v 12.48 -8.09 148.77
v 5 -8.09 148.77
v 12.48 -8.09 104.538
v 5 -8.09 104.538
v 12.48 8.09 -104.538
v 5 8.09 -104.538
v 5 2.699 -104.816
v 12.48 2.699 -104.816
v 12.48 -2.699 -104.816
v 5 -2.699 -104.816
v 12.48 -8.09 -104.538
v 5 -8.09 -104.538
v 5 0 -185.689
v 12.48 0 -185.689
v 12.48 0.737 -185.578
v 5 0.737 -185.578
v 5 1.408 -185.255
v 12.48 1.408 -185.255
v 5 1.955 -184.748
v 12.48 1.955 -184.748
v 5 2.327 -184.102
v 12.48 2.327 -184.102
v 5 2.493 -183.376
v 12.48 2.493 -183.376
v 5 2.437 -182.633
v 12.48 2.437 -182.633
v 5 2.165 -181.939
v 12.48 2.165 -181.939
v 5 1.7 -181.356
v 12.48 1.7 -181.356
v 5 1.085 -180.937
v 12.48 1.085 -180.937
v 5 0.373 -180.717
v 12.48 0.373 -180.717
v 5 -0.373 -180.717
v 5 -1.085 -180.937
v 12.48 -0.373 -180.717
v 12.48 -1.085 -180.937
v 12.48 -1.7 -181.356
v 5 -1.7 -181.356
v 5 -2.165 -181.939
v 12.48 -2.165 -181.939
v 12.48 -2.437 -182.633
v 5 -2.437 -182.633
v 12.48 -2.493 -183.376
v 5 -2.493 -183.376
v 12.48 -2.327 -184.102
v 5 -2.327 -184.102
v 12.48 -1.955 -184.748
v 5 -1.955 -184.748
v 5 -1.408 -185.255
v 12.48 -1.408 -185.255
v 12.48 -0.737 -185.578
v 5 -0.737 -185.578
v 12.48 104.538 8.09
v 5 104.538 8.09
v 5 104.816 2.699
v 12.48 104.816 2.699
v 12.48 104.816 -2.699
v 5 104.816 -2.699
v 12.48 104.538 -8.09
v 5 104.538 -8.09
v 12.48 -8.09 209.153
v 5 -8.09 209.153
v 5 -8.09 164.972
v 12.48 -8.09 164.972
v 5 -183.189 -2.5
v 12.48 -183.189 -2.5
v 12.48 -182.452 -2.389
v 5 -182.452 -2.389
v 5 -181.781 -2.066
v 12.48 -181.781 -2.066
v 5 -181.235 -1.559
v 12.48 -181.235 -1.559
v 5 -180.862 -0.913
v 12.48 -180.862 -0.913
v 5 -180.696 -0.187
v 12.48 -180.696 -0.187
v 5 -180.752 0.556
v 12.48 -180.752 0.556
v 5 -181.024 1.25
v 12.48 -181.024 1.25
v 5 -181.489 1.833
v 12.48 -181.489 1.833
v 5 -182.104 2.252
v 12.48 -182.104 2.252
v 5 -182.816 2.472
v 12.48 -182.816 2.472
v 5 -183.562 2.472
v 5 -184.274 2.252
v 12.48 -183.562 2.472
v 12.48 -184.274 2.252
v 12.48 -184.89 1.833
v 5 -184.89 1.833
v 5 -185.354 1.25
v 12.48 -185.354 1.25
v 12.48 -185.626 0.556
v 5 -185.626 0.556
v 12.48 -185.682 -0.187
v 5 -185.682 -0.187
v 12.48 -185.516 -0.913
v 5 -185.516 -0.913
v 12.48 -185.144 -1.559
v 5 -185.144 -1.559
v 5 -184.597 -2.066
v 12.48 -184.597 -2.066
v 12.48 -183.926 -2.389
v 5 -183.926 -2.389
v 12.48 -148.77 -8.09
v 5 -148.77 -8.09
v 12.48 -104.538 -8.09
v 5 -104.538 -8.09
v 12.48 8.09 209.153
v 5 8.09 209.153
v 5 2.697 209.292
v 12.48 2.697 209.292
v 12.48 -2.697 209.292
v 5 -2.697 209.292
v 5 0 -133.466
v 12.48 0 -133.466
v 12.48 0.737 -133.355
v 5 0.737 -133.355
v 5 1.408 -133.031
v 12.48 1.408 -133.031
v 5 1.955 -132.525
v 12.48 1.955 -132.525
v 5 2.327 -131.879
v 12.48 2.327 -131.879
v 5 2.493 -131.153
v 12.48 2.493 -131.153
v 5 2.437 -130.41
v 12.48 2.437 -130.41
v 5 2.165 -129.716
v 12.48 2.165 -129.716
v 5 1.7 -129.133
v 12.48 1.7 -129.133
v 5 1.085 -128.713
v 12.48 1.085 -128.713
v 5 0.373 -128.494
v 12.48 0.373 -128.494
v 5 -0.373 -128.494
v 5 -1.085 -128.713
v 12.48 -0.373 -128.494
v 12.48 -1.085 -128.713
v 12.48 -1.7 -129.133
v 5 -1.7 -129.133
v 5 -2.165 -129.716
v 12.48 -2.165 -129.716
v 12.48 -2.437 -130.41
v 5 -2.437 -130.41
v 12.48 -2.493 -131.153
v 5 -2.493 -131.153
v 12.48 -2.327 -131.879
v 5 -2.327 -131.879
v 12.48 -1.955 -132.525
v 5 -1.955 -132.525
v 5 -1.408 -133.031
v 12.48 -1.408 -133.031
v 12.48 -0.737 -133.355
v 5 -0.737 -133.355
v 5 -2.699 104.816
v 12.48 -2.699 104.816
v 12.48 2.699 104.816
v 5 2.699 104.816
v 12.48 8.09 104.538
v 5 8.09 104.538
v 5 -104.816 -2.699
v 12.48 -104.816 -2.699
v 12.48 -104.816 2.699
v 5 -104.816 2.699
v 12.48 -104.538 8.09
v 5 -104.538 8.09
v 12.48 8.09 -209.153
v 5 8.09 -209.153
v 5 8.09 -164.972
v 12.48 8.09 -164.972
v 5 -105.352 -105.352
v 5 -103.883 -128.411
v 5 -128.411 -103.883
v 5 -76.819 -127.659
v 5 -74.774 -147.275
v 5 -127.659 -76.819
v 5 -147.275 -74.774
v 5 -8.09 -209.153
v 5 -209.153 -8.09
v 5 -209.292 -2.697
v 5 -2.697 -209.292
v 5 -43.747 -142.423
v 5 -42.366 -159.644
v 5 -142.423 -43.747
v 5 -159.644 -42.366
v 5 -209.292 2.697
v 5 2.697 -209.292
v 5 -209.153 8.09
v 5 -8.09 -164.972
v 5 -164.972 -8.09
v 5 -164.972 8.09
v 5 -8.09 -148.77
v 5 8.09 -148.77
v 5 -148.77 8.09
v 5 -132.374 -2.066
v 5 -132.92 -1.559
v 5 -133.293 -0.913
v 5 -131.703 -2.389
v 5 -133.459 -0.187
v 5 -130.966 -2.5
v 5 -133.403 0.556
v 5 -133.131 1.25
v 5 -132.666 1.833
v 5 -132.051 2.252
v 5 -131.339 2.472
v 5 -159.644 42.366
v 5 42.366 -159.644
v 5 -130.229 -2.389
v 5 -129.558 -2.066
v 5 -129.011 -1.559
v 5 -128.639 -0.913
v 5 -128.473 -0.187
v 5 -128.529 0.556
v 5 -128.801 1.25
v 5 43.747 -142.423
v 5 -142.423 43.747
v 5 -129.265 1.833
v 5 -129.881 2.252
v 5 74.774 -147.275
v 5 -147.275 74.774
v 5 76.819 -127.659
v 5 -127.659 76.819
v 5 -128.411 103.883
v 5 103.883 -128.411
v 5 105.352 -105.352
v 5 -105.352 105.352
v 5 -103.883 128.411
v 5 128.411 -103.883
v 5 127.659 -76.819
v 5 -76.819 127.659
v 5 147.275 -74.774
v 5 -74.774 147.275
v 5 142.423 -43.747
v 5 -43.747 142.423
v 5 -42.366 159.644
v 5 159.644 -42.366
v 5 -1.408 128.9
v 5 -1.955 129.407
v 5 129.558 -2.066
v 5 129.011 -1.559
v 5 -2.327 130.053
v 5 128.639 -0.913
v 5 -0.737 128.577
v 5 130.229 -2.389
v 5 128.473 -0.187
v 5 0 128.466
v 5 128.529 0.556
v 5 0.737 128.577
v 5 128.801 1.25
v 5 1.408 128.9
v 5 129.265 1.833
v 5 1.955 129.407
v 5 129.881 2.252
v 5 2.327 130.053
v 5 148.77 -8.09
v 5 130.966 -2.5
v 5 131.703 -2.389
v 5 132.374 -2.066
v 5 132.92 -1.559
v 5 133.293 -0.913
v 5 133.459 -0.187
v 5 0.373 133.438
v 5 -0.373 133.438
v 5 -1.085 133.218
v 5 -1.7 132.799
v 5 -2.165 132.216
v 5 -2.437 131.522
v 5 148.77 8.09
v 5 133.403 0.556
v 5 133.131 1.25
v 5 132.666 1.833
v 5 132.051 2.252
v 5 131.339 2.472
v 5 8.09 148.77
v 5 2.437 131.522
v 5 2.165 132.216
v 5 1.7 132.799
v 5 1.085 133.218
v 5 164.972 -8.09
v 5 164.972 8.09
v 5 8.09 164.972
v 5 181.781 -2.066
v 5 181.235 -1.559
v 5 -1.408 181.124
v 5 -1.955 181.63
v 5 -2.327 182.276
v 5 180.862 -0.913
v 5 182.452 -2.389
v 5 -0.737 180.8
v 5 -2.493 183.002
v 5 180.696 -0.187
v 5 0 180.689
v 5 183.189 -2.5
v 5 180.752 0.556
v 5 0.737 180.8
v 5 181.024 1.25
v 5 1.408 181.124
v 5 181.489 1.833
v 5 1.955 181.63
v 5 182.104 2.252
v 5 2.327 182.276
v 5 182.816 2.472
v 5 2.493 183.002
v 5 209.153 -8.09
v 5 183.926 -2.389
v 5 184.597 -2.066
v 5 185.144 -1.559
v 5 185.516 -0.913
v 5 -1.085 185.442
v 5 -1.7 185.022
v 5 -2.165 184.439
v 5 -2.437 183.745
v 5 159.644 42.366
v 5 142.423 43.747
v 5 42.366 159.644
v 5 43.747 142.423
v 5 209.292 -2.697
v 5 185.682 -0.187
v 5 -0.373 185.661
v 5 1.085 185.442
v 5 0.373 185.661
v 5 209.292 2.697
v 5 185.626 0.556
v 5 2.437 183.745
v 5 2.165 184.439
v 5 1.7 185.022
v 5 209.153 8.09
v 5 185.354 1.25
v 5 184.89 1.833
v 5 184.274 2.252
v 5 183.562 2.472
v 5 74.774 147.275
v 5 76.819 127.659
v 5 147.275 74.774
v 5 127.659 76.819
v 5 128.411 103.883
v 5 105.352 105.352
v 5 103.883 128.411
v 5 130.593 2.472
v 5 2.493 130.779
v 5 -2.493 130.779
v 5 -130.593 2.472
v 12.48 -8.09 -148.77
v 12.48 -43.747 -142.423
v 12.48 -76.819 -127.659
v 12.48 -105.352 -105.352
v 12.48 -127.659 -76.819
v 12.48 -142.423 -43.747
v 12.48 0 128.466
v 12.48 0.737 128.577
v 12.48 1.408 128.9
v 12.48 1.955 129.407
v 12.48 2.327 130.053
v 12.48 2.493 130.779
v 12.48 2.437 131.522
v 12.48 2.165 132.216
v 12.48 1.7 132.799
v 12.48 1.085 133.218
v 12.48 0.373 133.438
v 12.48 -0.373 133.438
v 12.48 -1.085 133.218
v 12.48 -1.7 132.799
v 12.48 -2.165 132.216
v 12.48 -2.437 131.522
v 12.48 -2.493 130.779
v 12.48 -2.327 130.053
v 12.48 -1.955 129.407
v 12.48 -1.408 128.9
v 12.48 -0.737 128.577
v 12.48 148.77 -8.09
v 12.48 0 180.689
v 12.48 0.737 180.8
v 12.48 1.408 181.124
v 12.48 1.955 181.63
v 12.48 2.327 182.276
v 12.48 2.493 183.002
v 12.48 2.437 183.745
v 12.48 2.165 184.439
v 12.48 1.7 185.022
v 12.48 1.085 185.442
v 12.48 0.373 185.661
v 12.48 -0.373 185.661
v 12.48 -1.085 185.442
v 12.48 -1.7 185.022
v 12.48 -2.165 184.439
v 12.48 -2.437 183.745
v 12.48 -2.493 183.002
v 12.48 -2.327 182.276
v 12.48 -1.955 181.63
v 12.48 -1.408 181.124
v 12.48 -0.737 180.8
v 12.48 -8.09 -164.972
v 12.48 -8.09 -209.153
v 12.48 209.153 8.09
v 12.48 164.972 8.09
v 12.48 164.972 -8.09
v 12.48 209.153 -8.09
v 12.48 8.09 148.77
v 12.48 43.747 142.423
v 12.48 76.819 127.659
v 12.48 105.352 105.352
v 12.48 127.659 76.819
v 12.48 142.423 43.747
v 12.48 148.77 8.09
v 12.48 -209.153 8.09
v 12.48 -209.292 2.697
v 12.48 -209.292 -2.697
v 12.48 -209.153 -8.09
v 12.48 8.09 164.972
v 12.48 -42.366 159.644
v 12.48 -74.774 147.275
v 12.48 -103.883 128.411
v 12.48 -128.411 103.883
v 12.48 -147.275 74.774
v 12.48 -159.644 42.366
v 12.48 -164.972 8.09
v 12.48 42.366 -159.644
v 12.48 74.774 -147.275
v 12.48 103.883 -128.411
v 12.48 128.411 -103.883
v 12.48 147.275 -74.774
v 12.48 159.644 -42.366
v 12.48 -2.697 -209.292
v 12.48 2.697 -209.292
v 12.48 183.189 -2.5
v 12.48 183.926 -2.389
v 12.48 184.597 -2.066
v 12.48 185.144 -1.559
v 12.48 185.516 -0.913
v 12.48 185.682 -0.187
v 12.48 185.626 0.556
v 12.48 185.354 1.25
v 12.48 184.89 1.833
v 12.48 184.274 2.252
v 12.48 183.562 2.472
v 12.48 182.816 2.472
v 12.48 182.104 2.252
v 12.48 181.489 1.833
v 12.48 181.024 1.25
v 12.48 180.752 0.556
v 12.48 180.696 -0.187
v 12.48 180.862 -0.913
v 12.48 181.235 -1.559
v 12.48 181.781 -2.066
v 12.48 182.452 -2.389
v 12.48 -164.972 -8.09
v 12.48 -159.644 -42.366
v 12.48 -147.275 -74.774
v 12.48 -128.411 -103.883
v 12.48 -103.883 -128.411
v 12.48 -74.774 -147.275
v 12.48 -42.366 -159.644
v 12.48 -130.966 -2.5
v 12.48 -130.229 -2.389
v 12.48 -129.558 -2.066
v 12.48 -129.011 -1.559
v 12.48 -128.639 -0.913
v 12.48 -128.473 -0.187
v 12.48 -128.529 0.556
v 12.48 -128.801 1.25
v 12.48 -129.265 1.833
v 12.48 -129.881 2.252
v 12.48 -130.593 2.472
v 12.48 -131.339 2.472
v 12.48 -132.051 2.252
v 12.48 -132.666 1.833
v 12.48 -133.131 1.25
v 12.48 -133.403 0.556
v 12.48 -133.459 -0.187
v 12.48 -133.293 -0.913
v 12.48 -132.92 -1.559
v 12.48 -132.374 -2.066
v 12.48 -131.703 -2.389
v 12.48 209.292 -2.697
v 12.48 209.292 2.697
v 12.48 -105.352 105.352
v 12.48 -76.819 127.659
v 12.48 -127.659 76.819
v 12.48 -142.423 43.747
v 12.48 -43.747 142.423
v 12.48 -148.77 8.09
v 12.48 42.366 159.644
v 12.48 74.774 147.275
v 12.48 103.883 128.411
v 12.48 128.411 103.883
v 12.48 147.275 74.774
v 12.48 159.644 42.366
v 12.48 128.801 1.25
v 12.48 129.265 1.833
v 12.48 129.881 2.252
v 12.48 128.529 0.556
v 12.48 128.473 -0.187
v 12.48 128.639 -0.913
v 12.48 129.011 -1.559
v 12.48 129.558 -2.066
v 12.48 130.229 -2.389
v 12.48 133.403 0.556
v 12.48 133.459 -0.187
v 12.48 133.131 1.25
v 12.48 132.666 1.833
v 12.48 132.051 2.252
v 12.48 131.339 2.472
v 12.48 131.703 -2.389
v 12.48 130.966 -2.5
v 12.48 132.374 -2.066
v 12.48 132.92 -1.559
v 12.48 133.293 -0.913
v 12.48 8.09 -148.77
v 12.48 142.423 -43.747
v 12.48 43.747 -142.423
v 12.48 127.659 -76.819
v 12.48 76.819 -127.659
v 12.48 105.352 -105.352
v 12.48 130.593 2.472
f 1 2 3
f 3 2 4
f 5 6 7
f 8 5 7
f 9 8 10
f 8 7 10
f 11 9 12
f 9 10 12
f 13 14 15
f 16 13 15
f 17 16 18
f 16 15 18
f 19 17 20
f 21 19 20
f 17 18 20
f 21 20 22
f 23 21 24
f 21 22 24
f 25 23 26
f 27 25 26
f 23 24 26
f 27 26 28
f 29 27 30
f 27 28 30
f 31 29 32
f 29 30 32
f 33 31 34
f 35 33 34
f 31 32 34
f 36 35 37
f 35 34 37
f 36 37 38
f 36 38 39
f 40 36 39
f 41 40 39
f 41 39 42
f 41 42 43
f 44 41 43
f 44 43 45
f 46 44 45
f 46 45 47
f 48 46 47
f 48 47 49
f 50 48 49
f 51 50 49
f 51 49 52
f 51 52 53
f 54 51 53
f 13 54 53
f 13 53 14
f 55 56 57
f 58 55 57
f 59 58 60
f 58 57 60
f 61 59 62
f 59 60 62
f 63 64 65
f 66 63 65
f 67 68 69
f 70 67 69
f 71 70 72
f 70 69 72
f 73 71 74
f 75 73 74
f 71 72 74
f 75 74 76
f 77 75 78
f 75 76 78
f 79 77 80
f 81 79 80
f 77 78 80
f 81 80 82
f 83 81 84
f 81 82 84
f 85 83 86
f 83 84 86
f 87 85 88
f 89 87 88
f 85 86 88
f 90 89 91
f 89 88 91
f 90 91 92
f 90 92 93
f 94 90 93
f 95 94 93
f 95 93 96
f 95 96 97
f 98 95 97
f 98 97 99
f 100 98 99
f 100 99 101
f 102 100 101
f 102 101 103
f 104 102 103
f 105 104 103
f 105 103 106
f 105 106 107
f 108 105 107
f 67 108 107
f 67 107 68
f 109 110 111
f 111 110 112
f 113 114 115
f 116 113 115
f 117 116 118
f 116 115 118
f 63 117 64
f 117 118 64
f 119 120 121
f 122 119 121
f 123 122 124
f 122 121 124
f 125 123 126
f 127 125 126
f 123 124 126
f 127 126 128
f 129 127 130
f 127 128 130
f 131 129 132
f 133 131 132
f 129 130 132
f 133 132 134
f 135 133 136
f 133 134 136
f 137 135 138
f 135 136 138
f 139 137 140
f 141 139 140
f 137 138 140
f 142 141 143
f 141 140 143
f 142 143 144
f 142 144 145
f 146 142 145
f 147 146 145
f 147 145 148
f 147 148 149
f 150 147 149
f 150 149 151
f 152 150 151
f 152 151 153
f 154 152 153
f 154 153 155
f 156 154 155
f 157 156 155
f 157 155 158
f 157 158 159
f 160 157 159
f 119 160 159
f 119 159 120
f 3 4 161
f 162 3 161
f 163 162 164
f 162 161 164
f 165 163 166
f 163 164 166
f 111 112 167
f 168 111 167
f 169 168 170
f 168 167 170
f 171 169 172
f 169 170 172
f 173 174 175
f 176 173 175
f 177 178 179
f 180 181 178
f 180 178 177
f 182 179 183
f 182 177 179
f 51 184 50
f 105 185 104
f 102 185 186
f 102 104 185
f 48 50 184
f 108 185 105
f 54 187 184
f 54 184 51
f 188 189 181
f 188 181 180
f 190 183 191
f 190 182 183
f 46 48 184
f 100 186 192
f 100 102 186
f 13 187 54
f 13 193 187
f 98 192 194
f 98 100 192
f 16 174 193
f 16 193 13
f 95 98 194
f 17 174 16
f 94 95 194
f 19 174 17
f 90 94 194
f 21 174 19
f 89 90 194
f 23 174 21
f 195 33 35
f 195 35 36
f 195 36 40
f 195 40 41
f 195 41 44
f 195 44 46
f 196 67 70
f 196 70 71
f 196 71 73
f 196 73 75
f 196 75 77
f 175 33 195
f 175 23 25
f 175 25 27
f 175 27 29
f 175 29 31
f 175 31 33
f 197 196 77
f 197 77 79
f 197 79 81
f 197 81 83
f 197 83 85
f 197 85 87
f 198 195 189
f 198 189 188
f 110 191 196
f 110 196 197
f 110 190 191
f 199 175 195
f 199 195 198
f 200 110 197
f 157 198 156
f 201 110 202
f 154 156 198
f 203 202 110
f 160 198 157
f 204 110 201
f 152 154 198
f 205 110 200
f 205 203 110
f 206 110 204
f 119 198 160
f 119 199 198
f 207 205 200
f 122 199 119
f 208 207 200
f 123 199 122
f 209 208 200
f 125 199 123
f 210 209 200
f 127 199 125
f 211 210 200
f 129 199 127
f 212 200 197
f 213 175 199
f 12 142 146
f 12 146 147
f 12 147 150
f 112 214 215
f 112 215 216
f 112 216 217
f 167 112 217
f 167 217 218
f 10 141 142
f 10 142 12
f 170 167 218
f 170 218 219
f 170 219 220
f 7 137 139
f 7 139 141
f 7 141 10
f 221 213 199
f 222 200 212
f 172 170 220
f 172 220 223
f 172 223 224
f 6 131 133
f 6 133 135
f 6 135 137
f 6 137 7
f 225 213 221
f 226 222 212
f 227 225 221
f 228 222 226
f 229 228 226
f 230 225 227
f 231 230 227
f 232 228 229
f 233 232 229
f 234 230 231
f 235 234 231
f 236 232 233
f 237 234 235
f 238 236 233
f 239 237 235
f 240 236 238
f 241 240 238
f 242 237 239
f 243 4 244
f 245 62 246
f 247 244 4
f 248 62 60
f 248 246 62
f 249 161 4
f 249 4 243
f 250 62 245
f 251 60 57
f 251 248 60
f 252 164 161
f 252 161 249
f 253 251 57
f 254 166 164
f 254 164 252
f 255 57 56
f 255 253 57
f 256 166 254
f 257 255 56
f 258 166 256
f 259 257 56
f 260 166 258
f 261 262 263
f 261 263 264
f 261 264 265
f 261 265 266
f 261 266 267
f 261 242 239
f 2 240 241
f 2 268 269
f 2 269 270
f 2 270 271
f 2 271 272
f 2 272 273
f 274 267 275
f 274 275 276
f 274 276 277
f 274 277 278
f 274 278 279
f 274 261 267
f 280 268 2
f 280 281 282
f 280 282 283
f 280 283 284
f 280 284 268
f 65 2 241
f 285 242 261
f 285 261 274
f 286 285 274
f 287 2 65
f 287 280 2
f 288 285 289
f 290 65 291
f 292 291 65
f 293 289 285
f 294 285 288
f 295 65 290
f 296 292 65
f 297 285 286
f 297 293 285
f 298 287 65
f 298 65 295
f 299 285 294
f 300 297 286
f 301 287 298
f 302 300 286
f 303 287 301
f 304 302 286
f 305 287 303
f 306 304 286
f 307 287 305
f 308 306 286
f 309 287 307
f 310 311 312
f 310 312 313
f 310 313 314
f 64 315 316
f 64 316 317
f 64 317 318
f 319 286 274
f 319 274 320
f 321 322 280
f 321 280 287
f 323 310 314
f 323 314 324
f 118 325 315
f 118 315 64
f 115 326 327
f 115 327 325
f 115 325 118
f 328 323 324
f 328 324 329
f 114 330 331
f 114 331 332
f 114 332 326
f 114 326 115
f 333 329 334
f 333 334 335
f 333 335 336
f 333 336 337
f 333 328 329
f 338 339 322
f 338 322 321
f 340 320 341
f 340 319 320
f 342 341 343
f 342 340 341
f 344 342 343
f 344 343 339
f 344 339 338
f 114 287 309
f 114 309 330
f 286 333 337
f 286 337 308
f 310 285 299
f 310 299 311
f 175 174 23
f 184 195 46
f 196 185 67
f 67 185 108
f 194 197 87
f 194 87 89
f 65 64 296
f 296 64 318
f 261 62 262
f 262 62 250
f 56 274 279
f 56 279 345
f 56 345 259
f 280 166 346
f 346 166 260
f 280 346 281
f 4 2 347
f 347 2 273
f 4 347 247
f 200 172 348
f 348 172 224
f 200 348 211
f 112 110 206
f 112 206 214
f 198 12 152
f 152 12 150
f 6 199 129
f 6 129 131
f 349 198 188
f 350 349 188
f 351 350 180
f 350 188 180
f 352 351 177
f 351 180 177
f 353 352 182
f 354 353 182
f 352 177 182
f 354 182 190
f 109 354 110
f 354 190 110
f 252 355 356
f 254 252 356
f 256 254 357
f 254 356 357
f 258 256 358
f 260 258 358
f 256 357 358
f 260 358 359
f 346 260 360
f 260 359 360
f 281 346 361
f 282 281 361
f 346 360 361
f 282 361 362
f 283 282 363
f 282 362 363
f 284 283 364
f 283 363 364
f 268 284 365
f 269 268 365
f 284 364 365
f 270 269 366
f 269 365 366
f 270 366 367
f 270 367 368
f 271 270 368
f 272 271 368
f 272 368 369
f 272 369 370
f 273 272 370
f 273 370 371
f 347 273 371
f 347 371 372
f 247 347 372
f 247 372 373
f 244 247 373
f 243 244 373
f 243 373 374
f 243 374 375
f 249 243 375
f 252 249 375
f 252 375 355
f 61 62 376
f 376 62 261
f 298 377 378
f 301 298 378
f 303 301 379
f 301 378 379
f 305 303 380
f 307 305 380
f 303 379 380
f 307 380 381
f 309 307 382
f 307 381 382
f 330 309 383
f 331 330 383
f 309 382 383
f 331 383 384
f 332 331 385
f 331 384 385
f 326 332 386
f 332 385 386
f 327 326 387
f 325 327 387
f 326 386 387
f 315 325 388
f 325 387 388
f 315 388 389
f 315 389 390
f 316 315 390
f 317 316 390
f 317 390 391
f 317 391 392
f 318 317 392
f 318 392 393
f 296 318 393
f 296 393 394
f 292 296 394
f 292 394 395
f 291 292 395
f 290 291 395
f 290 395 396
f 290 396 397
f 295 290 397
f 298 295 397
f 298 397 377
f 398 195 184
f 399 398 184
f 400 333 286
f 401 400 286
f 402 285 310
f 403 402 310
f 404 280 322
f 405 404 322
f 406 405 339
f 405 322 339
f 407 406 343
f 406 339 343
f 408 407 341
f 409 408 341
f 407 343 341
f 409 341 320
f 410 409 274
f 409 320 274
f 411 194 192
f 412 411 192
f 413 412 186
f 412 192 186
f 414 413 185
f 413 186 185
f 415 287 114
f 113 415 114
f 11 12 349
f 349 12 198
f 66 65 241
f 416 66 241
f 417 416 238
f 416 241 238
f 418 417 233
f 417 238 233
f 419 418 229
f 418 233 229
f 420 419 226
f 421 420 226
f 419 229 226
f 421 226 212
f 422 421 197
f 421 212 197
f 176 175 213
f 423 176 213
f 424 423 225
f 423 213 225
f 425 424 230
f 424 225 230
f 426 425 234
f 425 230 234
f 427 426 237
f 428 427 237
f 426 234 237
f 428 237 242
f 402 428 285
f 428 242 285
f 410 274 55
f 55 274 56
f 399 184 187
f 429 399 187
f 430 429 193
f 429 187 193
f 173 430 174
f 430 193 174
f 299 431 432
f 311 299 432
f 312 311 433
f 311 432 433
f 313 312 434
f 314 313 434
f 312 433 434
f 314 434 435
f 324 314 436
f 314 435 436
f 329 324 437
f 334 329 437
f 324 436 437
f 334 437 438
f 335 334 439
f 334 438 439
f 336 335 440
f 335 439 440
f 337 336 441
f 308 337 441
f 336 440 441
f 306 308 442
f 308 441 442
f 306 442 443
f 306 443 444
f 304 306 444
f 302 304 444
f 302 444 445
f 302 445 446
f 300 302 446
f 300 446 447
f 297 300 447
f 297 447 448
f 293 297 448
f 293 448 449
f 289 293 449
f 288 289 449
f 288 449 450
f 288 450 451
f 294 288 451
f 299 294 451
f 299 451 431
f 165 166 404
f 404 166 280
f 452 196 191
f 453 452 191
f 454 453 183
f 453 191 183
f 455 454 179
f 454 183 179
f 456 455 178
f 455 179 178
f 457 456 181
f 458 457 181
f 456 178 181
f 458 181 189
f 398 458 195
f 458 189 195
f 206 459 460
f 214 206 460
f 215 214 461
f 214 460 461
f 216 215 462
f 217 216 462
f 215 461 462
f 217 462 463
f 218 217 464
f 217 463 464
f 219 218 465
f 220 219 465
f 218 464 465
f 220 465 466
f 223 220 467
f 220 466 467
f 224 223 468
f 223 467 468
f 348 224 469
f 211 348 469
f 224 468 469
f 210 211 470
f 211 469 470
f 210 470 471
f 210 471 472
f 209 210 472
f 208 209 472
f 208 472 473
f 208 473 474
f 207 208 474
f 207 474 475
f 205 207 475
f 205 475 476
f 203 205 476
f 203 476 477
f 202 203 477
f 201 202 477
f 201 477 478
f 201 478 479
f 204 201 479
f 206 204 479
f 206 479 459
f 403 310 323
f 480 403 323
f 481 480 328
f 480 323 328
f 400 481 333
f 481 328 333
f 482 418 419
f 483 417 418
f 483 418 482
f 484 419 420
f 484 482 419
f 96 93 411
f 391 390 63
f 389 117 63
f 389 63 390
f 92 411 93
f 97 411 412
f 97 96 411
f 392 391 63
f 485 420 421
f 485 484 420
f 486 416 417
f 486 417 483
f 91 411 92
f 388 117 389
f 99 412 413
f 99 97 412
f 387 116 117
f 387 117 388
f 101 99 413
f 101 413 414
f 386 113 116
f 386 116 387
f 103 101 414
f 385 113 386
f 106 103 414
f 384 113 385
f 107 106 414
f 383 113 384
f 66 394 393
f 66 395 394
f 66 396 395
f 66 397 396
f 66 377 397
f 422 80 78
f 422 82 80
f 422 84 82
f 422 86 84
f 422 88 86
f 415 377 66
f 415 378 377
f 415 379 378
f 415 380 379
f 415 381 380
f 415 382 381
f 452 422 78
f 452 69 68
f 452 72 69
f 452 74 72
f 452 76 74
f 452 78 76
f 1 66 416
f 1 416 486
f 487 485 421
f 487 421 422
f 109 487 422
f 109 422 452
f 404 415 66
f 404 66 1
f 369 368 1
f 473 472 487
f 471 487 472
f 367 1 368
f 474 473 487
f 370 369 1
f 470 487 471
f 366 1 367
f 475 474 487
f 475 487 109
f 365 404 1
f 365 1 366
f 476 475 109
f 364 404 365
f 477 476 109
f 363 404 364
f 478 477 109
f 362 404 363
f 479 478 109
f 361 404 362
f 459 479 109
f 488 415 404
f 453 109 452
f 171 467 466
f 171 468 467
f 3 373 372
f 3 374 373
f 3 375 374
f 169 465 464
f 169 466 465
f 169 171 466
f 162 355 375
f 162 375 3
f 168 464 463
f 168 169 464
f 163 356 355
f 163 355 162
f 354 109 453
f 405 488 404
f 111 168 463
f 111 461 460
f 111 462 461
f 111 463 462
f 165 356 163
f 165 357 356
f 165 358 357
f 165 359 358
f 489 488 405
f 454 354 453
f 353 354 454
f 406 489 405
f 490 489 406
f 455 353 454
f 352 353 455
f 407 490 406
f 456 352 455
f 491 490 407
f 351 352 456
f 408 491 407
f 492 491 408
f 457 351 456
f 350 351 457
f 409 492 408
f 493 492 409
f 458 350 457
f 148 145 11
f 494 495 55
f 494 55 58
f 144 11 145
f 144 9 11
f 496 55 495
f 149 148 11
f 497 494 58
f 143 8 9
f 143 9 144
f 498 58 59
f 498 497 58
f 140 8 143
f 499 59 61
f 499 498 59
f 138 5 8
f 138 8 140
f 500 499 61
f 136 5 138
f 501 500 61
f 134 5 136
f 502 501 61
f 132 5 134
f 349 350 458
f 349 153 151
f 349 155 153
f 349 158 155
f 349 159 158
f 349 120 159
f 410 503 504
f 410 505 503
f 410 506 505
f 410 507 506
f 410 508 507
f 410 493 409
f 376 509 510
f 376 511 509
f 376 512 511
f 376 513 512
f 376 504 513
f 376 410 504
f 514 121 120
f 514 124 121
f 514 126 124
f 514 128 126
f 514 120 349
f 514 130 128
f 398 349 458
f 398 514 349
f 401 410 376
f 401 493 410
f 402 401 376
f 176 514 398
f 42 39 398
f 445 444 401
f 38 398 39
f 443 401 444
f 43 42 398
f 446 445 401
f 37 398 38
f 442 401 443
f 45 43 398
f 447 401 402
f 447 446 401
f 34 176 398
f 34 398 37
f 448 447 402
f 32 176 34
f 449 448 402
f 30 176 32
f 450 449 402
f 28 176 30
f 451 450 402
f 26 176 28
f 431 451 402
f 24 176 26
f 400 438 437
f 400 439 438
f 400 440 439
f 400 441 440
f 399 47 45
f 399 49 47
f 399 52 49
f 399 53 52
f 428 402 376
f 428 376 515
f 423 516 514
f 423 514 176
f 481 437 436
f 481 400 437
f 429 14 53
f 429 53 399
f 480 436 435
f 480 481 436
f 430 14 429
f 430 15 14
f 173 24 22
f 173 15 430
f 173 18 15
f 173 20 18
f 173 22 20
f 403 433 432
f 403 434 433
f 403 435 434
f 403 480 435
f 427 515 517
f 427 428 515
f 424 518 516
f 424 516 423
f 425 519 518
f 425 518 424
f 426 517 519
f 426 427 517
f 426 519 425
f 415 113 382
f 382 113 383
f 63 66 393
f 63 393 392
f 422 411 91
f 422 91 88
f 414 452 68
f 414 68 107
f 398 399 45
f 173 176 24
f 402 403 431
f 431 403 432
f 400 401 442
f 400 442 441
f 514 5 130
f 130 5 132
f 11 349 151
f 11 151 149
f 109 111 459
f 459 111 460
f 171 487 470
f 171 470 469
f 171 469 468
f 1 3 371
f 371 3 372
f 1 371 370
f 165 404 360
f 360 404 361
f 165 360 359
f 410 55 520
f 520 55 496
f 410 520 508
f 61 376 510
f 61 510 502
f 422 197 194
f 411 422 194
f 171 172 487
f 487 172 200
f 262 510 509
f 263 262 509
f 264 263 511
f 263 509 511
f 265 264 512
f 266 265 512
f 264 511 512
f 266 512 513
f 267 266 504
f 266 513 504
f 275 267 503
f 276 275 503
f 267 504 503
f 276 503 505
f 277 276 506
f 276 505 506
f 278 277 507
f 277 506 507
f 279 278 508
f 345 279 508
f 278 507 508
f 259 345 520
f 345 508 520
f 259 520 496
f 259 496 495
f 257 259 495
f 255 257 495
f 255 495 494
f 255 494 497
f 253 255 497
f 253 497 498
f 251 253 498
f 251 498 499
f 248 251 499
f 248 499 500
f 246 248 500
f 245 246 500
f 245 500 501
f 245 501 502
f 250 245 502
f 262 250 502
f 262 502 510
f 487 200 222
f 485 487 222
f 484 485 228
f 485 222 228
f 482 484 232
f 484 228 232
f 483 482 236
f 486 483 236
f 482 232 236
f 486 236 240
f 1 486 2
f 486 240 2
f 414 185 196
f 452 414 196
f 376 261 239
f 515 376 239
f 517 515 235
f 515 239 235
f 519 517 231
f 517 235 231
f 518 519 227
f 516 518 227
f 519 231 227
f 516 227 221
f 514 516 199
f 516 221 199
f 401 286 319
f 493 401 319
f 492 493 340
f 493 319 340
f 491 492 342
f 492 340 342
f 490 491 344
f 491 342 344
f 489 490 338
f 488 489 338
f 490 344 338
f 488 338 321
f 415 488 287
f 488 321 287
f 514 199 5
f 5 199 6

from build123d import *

# Parameters (mm, degrees)
SKETCH1_W           = 450
SKETCH1_H           = 450
BOSS_EXTRUDE1_DEPTH = 5
BOSS_EXTRUDE2_DEPTH = 7.48
BOSS_EXTRUDE3_DEPTH = 7.48
SKETCH6_W           = 450
SKETCH6_H           = 450
CUT_EXTRUDE1_DEPTH  = 5
SKETCH7_R           = 11
SKETCH7_R_2         = 2.5
CUT_EXTRUDE2_DEPTH  = 10
SKETCH8_R           = 2.5
CUT_EXTRUDE4_DEPTH  = 10


# Read off the part's stored shape, not the designer's step: Boss-Extrude2
with BuildPart() as part:
    # Sketch1 → Boss-Extrude1 (new body)
    with BuildSketch(Plane(origin=(0, 0, 0), x_dir=(0, 0, -1), z_dir=(1, 0, 0))):
        Rectangle(SKETCH1_W, SKETCH1_H)
    extrude(amount=BOSS_EXTRUDE1_DEPTH)

    # Boss-Extrude2 outline → Boss-Extrude2 (add)
    with BuildSketch(Plane(origin=(5, 0, 0), x_dir=(0, 0, -1), z_dir=(1, 0, 0))):
        with BuildLine():
            Line((-164.971757583, 8.09), (-209.152698388, 8.09))
            ThreePointArc((-209.152698388, 8.09), (-209.3091, 0), (-209.152698388, -8.09))
            Line((-209.152698388, -8.09), (-164.971757583, -8.09))
            ThreePointArc((-164.971757583, -8.09), (-116.792827049, -116.792827049), (-8.09, -164.971757583))
            Line((-8.09, -164.971757583), (-8.09, -209.152698388))
            ThreePointArc((-8.09, -209.152698388), (0, -209.3091), (8.09, -209.152698388))
            Line((8.09, -209.152698388), (8.09, -164.971757583))
            ThreePointArc((8.09, -164.971757583), (116.792827049, -116.792827049), (164.971757583, -8.09))
            Line((164.971757583, -8.09), (209.152698388, -8.09))
            ThreePointArc((209.152698388, -8.09), (209.3091, 0), (209.152698388, 8.09))
            Line((209.152698388, 8.09), (164.971757583, 8.09))
            ThreePointArc((164.971757583, 8.09), (116.792827049, 116.792827049), (8.09, 164.971757583))
            Line((8.09, 164.971757583), (8.09, 209.152698388))
            ThreePointArc((8.09, 209.152698388), (0, 209.3091), (-8.09, 209.152698388))
            Line((-8.09, 209.152698388), (-8.09, 164.971757583))
            ThreePointArc((-8.09, 164.971757583), (-116.792827049, 116.792827049), (-164.971757583, 8.09))
        make_face()
        with BuildLine():
            Line((148.770198629, 8.09), (104.538333308, 8.09))
            ThreePointArc((104.538333308, 8.09), (104.8509, 0), (104.538333308, -8.09))
            Line((104.538333308, -8.09), (148.770198629, -8.09))
            ThreePointArc((148.770198629, -8.09), (105.351839329, -105.351839329), (8.09, -148.770198629))
            Line((8.09, -148.770198629), (8.09, -104.538333308))
            ThreePointArc((8.09, -104.538333308), (0, -104.8509), (-8.09, -104.538333308))
            Line((-8.09, -104.538333308), (-8.09, -148.770198629))
            ThreePointArc((-8.09, -148.770198629), (-105.351839329, -105.351839329), (-148.770198629, -8.09))
            Line((-148.770198629, -8.09), (-104.538333308, -8.09))
            ThreePointArc((-104.538333308, -8.09), (-104.8509, 0), (-104.538333308, 8.09))
            Line((-104.538333308, 8.09), (-148.770198629, 8.09))
            ThreePointArc((-148.770198629, 8.09), (-105.351839329, 105.351839329), (-8.09, 148.770198629))
            Line((-8.09, 148.770198629), (-8.09, 104.538333308))
            ThreePointArc((-8.09, 104.538333308), (0, 104.8509), (8.09, 104.538333308))
            Line((8.09, 104.538333308), (8.09, 148.770198629))
            ThreePointArc((8.09, 148.770198629), (105.351839329, 105.351839329), (148.770198629, 8.09))
        make_face(mode=Mode.SUBTRACT)
    extrude(amount=BOSS_EXTRUDE2_DEPTH)

    # Sketch5 → Boss-Extrude3 (add)
    with BuildSketch(Plane(origin=(5, 0, 0), x_dir=(0, 0, -1), z_dir=(1, 0, 0))):
        with BuildLine():
            Line((-19.319547743, 8.09), (-104.275748565, 8.09))
            ThreePointArc((-104.275748565, 8.09), (-104.5891, 0), (-104.275748565, -8.09))
            Line((-104.275748565, -8.09), (-19.319547743, -8.09))
            ThreePointArc((-19.319547743, -8.09), (0, -20.945), (19.319547743, -8.09))
            Line((19.319547743, -8.09), (104.275748565, -8.09))
            ThreePointArc((104.275748565, -8.09), (104.5891, 0), (104.275748565, 8.09))
            Line((104.275748565, 8.09), (19.319547743, 8.09))
            ThreePointArc((19.319547743, 8.09), (0, 20.945), (-19.319547743, 8.09))
        make_face()
    extrude(amount=BOSS_EXTRUDE3_DEPTH)

    # Sketch6 → Cut-Extrude1 (cut)
    with BuildSketch(Plane.ZY):
        Rectangle(SKETCH6_W, SKETCH6_H)
    extrude(amount=-CUT_EXTRUDE1_DEPTH, mode=Mode.SUBTRACT)


with BuildPart() as cut_extrude1_piece_1:
    # of the separate pieces the step leaves, piece 1, a body of its own (cut_extrude1_pieces)
    add(part.part.solids().sort_by_distance((5, 209.152698388, 8.09))[0])


with BuildPart() as cut_extrude1_piece_2:
    # of the separate pieces the step leaves, piece 2, a body of its own (cut_extrude1_pieces)
    add(part.part.solids().sort_by_distance((5, 8.09, -104.275748565))[0])


with BuildPart() as cut_extrude2_tool:
    # Sketch7 → Cut-Extrude2 (new body)
    with BuildSketch(Plane(origin=(12.48, 0, 0), x_dir=(0, 0, -1), z_dir=(1, 0, 0))):
        Circle(SKETCH7_R)
        with Locations((-183.1891, 0)):
            Circle(SKETCH7_R_2)
        with Locations((-130.9659, 0)):
            Circle(SKETCH7_R_2)
        with Locations((0, -183.1891)):
            Circle(SKETCH7_R_2)
        with Locations((0, -130.9659)):
            Circle(SKETCH7_R_2)
        with Locations((183.1891, 0)):
            Circle(SKETCH7_R_2)
        with Locations((52.3, 0)):
            Circle(SKETCH7_R_2)
        with Locations((-52.295, 0)):
            Circle(SKETCH7_R_2)
        with Locations((0, 183.1891)):
            Circle(SKETCH7_R_2)
        with Locations((0, 130.9659)):
            Circle(SKETCH7_R_2)
        with BuildLine():
            Line((-3, 13.8), (-3, 10.583005244))
            ThreePointArc((-3, 10.583005244), (0, 11), (3, 10.583005244))
            Line((3, 10.583005244), (3, 13.8))
            Line((3, 13.8), (-3, 13.8))
        make_face()
        with Locations((130.9659, 0)):
            Circle(SKETCH7_R_2)
    extrude(amount=-CUT_EXTRUDE2_DEPTH)


with BuildPart() as cut_extrude1_piece_1_1:
    add(cut_extrude1_piece_1.part)

    # Cut-Extrude2: cut by cut_extrude2_tool
    add(cut_extrude2_tool.part, mode=Mode.SUBTRACT)


with BuildPart() as cut_extrude1_piece_2_1:
    add(cut_extrude1_piece_2.part)

    # Cut-Extrude2: cut by cut_extrude2_tool
    add(cut_extrude2_tool.part, mode=Mode.SUBTRACT)

    # Sketch8 → Cut-Extrude4 (cut)
    with BuildSketch(Plane(origin=(12.48, 0, 0), x_dir=(0, 0, -1), z_dir=(1, 0, 0))):
        with BuildLine():
            ThreePointArc((19.319547743, 8.09), (0, 20.945), (-19.319547743, 8.09))
            Line((-19.319547743, 8.09), (-104.275748565, 8.09))
            ThreePointArc((-104.275748565, 8.09), (-104.5891, 0), (-104.275748565, -8.09))
            Line((-104.275748565, -8.09), (-19.319547743, -8.09))
            ThreePointArc((-19.319547743, -8.09), (0, -20.945), (19.319547743, -8.09))
            Line((19.319547743, -8.09), (104.275748565, -8.09))
            ThreePointArc((104.275748565, -8.09), (104.5891, 0), (104.275748565, 8.09))
            Line((104.275748565, 8.09), (19.319547743, 8.09))
        make_face()
        with Locations((-52.295, 0)):
            Circle(SKETCH8_R, mode=Mode.SUBTRACT)
        with Locations((52.3, 0)):
            Circle(SKETCH8_R, mode=Mode.SUBTRACT)
        with BuildLine():
            Line((3, 13.8), (3, 10.583005244))
            ThreePointArc((3, 10.583005244), (0, -11), (-3, 10.583005244))
            Line((-3, 10.583005244), (-3, 13.8))
            Line((-3, 13.8), (3, 13.8))
        make_face(mode=Mode.SUBTRACT)
    extrude(amount=-CUT_EXTRUDE4_DEPTH, mode=Mode.SUBTRACT)


solid = cut_extrude1_piece_1_1.part
